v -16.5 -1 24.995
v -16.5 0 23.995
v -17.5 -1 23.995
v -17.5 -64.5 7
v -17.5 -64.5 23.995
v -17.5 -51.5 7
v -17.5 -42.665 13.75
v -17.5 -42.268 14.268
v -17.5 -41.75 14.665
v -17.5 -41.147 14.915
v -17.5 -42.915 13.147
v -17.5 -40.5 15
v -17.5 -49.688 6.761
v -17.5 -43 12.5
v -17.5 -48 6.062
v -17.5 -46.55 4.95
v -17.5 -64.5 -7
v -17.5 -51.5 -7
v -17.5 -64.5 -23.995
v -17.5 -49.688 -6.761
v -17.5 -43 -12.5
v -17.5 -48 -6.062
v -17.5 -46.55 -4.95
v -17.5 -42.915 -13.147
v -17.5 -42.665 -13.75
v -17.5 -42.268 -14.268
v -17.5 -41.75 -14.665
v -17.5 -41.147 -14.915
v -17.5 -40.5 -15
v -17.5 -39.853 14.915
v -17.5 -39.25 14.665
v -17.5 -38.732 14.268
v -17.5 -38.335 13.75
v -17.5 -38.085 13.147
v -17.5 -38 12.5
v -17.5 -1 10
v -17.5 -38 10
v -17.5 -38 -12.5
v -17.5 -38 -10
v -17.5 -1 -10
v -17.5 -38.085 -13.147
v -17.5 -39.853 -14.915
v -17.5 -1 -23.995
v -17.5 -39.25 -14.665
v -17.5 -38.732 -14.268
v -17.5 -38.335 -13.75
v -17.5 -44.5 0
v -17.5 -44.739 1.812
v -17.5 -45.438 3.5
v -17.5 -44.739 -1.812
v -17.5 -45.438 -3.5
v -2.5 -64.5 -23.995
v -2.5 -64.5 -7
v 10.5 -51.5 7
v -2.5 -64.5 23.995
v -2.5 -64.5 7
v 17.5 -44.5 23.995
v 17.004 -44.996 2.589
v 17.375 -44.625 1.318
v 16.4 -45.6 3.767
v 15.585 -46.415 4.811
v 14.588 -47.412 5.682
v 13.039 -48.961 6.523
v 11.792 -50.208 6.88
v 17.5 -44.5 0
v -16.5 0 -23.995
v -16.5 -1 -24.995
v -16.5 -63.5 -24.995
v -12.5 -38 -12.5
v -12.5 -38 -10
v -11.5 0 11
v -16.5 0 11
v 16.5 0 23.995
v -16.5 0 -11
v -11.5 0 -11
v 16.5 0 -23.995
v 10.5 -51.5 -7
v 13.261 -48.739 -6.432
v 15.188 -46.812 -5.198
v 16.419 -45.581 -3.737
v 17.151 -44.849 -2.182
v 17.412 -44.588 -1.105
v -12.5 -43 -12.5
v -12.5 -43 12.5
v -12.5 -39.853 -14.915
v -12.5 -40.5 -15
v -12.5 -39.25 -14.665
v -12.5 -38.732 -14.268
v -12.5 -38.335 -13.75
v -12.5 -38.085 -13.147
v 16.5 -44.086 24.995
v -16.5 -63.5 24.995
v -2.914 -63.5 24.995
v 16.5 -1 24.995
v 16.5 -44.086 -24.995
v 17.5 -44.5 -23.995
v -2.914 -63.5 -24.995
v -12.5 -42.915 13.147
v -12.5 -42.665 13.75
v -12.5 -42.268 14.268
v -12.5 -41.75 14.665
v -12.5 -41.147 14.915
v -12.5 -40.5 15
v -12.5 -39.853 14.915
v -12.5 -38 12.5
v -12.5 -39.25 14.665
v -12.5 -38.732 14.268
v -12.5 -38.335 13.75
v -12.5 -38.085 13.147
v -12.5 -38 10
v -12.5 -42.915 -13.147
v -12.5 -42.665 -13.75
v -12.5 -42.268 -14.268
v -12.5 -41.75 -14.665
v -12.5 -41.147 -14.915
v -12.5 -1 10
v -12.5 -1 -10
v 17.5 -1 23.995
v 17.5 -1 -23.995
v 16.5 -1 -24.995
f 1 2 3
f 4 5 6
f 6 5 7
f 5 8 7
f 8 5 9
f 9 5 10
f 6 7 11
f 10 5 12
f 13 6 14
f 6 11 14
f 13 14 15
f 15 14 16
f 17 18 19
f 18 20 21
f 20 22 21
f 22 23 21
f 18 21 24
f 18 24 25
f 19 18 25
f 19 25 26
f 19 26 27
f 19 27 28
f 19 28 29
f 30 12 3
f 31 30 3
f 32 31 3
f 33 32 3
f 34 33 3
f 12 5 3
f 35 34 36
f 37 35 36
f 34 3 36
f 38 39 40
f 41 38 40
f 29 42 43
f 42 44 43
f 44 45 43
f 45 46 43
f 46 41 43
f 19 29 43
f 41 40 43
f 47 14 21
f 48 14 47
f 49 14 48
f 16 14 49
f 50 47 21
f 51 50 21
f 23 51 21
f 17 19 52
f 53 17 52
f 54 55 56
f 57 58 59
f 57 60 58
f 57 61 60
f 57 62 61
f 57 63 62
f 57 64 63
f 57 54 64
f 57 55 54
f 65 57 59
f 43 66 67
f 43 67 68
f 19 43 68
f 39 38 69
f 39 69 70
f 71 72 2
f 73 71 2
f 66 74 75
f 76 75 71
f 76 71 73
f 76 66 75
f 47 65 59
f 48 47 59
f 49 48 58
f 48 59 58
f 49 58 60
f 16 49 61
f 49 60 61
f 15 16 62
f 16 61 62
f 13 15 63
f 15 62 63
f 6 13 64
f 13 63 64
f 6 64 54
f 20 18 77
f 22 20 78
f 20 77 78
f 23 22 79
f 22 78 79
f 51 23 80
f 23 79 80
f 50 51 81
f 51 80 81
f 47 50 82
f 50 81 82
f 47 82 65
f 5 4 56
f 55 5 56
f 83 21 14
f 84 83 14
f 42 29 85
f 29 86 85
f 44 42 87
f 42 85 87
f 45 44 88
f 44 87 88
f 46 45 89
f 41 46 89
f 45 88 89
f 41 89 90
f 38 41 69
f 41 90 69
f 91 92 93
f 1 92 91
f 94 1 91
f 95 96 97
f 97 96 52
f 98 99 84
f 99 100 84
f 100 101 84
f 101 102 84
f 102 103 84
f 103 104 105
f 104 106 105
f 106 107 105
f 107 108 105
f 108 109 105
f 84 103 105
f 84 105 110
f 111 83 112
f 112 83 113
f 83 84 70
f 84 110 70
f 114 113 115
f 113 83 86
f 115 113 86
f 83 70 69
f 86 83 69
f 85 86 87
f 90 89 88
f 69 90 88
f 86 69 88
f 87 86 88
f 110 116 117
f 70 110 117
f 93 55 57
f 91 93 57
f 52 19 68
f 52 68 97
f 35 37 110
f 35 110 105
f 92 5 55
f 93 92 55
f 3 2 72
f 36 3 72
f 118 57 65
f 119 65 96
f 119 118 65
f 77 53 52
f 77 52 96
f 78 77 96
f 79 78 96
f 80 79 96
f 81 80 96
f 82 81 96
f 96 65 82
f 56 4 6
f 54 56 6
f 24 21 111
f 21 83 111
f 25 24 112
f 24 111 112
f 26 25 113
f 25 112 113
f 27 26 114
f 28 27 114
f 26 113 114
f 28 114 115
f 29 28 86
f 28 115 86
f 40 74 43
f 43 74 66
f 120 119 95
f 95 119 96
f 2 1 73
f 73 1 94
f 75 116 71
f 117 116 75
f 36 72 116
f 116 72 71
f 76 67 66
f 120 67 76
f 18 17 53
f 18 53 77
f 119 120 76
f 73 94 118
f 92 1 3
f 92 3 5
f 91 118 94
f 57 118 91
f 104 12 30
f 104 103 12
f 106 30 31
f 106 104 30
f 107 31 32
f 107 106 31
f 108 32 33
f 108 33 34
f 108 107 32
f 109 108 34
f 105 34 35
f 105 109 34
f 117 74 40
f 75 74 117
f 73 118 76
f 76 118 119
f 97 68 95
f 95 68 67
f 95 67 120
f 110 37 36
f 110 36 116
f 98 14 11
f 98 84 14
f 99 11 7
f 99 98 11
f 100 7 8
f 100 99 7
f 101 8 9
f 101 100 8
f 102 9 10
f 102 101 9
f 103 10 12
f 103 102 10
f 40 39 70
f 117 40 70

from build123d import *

# Parameters (mm, degrees)
SKETCH1_W           = 35
SKETCH1_H           = 49.99
BOSS_EXTRUDE1_DEPTH = 64.5
CUT_EXTRUDE1_REACH  = 85.46
CUT_EXTRUDE2_REACH  = 79.524
SKETCH3_W           = 14
SKETCH3_H           = 20
FILLET1_R           = 7
SKETCH4_W           = 5
SKETCH4_H           = 20
CUT_EXTRUDE3_DEPTH  = 43
SKETCH5_W           = 30
SKETCH5_H           = 5
CUT_EXTRUDE4_DEPTH  = 5
FILLET5_R           = 2.5
FILLET6_R           = 2.5
CHAMFER1_SIZE       = 1


with BuildPart() as part:
    # Sketch1 → Boss-Extrude1 (new body)
    with BuildSketch(Plane(origin=(0, 0, 0), x_dir=(1, 0, 0), z_dir=(0, 1, 0))):
        Rectangle(SKETCH1_W, SKETCH1_H)
    extrude(amount=-BOSS_EXTRUDE1_DEPTH)

    # Sketch2 → Cut-Extrude1 (cut, up to next)
    with BuildSketch(Plane.XY.offset(24.995), mode=Mode.PRIVATE) as cut_extrude1_sk1:
        Polygon((-2.5, -64.5), (17.5, -44.5), (17.5, -64.5), align=None)
    cut_extrude1_tool1 = extrude(cut_extrude1_sk1.sketch, amount=-CUT_EXTRUDE1_REACH, mode=Mode.PRIVATE) & part.part
    add(cut_extrude1_tool1.solids().sort_by_distance((10.833333, -57.833333, 24.995))[0], mode=Mode.SUBTRACT)

    # Sketch3 → Cut-Extrude2 (cut, up to next)
    with BuildSketch(Plane.ZY.offset(17.5), mode=Mode.PRIVATE) as cut_extrude2_sk1:
        with Locations((0, -54.5)):
            Rectangle(SKETCH3_W, SKETCH3_H)
    cut_extrude2_tool1 = extrude(cut_extrude2_sk1.sketch, amount=-CUT_EXTRUDE2_REACH, mode=Mode.PRIVATE) & part.part
    add(cut_extrude2_tool1.solids().sort_by_distance((-17.5, -54.5, 0))[0], mode=Mode.SUBTRACT)

    # Fillet1
    fillet1_edges = [part.edges().sort_by_distance(p)[0] for p in [
        (0, -44.5, -7),
        (0, -44.5, 7),
    ]]
    fillet(fillet1_edges, radius=FILLET1_R - 0.0001)  # a hair under: the kernel refuses the full size

    # Sketch4 → Cut-Extrude3 (cut)
    with BuildSketch(Plane(origin=(0, 0, 0), x_dir=(1, 0, 0), z_dir=(0, 1, 0))):
        with Locations((-15, 0)):
            Rectangle(SKETCH4_W, SKETCH4_H)
    extrude(amount=-CUT_EXTRUDE3_DEPTH, mode=Mode.SUBTRACT)

    # Sketch5 → Cut-Extrude4 (cut)
    with BuildSketch(Plane.ZY.offset(17.5)):
        with Locations((0, -40.5)):
            Rectangle(SKETCH5_W, SKETCH5_H)
    extrude(amount=-CUT_EXTRUDE4_DEPTH, mode=Mode.SUBTRACT)

    # Fillet5
    fillet5_edges = [part.edges().sort_by_distance(p)[0] for p in [
        (-15, -38, -15),
        (-15, -43, -15),
    ]]
    fillet(fillet5_edges, radius=FILLET5_R - 0.0001)  # a hair under: the kernel refuses the full size

    # Fillet6
    fillet6_edges = [part.edges().sort_by_distance(p)[0] for p in [
        (-15, -43, 15),
        (-15, -38, 15),
    ]]
    fillet(fillet6_edges, radius=FILLET6_R - 0.0001)  # a hair under: the kernel refuses the full size

    # Chamfer1
    chamfer1_edges = [part.edges().sort_by_distance(p)[0] for p in [
        (-10, -64.5, -24.995),
        (17.5, -22.25, -24.995),
        (17.5, -22.25, 24.995),
        (-10, -64.5, 24.995),
        (7.5, -54.5, -24.995),
        (7.5, -54.5, 24.995),
        (0, 0, 24.995),
        (-17.5, 0, -17.4975),
        (-17.5, 0, 17.4975),
        (0, 0, -24.995),
        (17.5, 0, 0),
        (-15, 0, 10),
        (-12.5, 0, 0),
        (-15, 0, -10),
        (-17.5, -32.25, 24.995),
        (-17.5, -32.25, -24.995),
    ]]
    chamfer(chamfer1_edges, length=CHAMFER1_SIZE)


solid = part.part
